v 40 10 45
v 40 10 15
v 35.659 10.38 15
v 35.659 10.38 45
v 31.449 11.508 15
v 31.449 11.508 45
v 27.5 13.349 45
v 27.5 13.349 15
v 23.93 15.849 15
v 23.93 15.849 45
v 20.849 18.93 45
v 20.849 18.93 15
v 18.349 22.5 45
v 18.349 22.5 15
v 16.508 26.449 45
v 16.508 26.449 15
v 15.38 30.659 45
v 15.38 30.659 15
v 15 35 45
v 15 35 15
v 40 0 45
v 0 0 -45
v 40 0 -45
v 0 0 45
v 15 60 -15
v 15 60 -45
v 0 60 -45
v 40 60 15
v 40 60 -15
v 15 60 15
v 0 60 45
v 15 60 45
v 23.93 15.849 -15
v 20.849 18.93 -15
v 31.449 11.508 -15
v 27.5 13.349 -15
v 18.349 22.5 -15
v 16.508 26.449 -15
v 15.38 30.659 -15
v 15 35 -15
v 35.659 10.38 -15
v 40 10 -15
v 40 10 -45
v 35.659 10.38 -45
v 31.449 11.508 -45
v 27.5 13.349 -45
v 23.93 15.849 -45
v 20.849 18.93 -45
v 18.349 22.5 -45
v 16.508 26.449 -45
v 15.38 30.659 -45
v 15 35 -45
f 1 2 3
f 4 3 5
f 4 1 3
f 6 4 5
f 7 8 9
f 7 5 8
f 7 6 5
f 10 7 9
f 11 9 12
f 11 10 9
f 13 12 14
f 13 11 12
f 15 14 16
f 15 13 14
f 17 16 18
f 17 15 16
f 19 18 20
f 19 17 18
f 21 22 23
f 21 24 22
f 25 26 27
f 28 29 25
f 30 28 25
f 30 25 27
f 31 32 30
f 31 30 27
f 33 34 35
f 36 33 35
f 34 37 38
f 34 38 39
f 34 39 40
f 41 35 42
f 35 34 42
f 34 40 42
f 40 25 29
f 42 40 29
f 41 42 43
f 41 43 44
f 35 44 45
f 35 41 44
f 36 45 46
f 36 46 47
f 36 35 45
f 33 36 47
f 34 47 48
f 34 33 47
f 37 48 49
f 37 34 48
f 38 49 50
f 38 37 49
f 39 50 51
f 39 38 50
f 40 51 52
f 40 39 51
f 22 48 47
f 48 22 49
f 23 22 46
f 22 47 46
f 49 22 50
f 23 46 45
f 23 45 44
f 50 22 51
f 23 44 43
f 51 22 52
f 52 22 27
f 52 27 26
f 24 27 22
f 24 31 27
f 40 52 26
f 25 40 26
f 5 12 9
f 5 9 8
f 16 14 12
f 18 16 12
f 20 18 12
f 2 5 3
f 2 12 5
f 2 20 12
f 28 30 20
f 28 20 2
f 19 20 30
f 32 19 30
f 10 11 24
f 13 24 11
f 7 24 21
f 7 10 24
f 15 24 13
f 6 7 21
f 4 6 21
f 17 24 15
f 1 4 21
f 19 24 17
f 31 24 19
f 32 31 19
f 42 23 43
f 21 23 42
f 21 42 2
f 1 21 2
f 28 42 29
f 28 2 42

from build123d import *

# Parameters (mm, degrees)
BOSS_EXTRUDE1_DEPTH = 45
BOSS_EXTRUDE2_DEPTH = 15


with BuildPart() as part:
    # Sketch1 → Boss-Extrude1 (new, symmetric)
    with BuildSketch(Plane.XY):
        with BuildLine():
            Line((0, 0), (40, 0))
            Line((40, 0), (40, 10))
            ThreePointArc((40, 10), (22.32233047, 17.32233047), (15, 35))
            Line((15, 35), (15, 60))
            Line((15, 60), (0, 60))
            Line((0, 60), (0, 0))
        make_face()
    extrude(amount=BOSS_EXTRUDE1_DEPTH, both=True)

    # Sketch1<3> → Boss-Extrude2 (add, symmetric)
    with BuildSketch(Plane.XY):
        with BuildLine():
            ThreePointArc((15, 35), (22.32233047, 17.32233047), (40, 10))
            Line((40, 10), (40, 60))
            Line((40, 60), (15, 60))
            Line((15, 60), (15, 35))
        make_face()
    extrude(amount=BOSS_EXTRUDE2_DEPTH, both=True)


solid = part.part
